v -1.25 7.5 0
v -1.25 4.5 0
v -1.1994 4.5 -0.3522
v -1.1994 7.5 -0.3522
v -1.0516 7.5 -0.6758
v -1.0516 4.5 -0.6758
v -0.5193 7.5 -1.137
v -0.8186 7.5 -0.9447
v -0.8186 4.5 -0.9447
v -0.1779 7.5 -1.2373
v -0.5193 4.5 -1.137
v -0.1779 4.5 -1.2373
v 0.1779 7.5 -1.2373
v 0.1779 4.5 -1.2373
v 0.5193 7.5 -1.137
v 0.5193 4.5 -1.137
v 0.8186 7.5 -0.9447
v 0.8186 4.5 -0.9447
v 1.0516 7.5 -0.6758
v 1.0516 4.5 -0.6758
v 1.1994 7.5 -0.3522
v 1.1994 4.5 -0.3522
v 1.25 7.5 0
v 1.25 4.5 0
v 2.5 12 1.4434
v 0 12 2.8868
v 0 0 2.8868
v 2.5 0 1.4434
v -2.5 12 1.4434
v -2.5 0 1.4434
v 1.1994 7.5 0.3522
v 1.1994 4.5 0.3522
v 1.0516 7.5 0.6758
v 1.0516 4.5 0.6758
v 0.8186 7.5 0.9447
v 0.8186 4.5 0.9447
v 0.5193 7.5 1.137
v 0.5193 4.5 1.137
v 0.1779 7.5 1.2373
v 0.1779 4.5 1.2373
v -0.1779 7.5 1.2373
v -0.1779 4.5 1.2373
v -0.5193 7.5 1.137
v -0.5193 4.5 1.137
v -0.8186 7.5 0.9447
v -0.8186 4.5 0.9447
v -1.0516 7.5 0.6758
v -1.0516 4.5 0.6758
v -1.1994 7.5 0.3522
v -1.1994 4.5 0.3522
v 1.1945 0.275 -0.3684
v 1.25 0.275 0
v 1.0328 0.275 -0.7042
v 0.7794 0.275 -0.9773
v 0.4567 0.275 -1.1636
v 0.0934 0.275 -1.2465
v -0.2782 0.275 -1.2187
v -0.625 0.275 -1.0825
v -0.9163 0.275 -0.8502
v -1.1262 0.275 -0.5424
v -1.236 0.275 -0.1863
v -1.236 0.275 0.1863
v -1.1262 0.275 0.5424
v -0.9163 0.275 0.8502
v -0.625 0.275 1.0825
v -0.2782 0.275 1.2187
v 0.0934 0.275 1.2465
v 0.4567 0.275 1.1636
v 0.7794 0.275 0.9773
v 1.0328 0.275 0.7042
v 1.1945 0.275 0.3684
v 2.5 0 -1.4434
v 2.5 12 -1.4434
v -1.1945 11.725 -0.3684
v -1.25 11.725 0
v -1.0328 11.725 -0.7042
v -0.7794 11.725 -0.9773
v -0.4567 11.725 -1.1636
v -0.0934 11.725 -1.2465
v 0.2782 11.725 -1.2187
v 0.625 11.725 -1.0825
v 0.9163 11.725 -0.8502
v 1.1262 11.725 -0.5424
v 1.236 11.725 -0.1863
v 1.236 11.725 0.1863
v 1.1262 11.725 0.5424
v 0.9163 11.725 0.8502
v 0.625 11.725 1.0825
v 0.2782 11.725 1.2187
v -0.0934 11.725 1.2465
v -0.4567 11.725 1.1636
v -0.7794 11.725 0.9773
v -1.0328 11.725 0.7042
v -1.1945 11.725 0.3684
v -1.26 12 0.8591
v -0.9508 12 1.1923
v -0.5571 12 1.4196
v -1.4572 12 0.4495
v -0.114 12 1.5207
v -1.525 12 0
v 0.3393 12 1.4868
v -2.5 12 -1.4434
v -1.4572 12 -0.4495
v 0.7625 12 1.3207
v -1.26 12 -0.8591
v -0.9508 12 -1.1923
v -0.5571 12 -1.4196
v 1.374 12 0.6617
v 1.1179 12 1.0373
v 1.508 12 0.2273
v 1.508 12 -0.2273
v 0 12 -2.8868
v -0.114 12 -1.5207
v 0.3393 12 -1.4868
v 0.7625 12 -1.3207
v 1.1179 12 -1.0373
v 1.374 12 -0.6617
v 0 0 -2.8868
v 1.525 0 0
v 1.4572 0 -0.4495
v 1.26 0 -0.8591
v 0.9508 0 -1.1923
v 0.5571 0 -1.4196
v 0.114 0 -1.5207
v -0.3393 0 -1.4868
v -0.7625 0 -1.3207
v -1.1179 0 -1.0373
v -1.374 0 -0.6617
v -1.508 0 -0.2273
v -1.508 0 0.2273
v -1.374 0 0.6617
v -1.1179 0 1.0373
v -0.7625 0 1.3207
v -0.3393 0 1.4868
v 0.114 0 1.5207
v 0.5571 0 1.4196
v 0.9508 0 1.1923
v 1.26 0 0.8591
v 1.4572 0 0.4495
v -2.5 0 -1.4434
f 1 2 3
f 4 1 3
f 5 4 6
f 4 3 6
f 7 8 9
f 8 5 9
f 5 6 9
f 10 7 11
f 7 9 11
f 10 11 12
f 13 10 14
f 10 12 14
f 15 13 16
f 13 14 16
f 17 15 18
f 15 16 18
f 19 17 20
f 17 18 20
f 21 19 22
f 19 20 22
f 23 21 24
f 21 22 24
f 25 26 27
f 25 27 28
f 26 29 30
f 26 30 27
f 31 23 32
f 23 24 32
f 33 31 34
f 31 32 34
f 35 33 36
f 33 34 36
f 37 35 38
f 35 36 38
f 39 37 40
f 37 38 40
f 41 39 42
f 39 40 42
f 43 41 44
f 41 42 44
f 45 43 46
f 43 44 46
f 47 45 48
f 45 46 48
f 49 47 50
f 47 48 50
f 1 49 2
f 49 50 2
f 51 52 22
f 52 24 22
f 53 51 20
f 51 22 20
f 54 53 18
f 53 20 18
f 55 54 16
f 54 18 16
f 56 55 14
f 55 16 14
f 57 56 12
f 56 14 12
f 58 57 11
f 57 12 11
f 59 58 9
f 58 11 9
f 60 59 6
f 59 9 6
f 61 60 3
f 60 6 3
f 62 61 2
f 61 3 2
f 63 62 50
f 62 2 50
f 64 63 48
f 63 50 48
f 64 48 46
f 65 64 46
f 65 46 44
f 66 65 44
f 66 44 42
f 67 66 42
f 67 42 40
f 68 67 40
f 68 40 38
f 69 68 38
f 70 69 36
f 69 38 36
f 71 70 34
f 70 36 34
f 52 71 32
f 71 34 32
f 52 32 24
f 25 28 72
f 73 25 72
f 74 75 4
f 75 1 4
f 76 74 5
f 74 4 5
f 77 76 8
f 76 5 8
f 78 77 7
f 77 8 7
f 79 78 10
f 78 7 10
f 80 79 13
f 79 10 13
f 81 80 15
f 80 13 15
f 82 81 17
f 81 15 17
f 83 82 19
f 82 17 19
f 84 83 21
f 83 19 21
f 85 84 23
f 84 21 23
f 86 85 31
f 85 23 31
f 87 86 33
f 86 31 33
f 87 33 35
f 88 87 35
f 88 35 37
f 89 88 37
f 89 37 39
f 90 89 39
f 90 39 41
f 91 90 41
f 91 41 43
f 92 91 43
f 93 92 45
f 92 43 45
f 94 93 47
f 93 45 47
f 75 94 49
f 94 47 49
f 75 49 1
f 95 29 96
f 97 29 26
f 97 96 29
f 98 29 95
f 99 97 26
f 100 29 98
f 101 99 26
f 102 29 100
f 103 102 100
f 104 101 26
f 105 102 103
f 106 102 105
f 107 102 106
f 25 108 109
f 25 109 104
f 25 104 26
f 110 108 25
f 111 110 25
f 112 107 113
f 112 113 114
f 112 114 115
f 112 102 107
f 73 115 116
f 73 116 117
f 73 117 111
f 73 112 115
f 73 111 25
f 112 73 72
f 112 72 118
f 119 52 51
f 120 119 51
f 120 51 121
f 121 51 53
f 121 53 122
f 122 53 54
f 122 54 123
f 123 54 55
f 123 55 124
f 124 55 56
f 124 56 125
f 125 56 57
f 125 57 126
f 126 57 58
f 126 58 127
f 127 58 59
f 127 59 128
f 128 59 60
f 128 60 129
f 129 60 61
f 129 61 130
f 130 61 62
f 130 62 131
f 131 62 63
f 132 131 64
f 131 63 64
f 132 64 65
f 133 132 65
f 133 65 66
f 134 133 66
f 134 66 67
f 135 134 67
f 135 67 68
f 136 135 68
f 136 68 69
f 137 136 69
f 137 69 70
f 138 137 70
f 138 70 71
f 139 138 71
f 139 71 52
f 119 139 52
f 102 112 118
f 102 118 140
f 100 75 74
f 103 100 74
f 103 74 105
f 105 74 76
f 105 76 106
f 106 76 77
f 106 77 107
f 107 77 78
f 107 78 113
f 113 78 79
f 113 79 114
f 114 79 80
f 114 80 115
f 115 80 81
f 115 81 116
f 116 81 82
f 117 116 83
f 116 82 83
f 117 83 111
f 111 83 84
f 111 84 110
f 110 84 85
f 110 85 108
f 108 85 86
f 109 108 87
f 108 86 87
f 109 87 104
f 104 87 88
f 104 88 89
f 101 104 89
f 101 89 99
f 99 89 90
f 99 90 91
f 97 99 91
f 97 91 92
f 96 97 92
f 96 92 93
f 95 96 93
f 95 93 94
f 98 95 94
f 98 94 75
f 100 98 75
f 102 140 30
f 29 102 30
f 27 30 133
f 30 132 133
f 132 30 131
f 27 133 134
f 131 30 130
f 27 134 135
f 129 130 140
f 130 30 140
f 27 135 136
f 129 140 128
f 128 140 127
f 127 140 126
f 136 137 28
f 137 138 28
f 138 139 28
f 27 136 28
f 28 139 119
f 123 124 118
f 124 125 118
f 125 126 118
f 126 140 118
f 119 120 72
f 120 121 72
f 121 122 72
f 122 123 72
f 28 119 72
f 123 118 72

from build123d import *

# Parameters (mm, degrees)
BOSS_EXTRUDE1_DEPTH         = 12
M3_TAPPED_HOLE1_D           = 2.5
M3_TAPPED_HOLE1_DEPTH       = 7.5
M3_TAPPED_HOLE1_CSINK_D     = 3.05
M3_TAPPED_HOLE1_CSINK_ANGLE = 90
M3_TAPPED_HOLE1_TIP         = 0.751075774
M3_TAPPED_HOLE2_D           = 2.5
M3_TAPPED_HOLE2_DEPTH       = 7.5
M3_TAPPED_HOLE2_CSINK_D     = 3.05
M3_TAPPED_HOLE2_CSINK_ANGLE = 90
M3_TAPPED_HOLE2_TIP         = 0.751075774


with BuildPart() as part:
    # Sketch1 → Boss-Extrude1 (new body)
    with BuildSketch(Plane(origin=(0, 0, 0), x_dir=(1, 0, 0), z_dir=(0, 1, 0))):
        Polygon((-2.5, 1.443375673), (-2.5, -1.443375673), (0, -2.886751346), (2.5, -1.443375673), (2.5, 1.443375673), (0, 2.886751346), align=None)
    extrude(amount=BOSS_EXTRUDE1_DEPTH)

    # M3 Tapped Hole1
    with Locations(Plane(origin=(0, 12, 0), x_dir=(1, 0, 0), z_dir=(0, 1, 0))):
        with Locations((0, 0)):
            CounterSinkHole(M3_TAPPED_HOLE1_D / 2, M3_TAPPED_HOLE1_CSINK_D / 2, depth=M3_TAPPED_HOLE1_DEPTH, counter_sink_angle=M3_TAPPED_HOLE1_CSINK_ANGLE)
            with Locations((0, 0, -(M3_TAPPED_HOLE1_DEPTH + M3_TAPPED_HOLE1_TIP / 2))):  # 118° drill point
                Cone(0, M3_TAPPED_HOLE1_D / 2, M3_TAPPED_HOLE1_TIP, mode=Mode.SUBTRACT)

    # M3 Tapped Hole2
    with Locations(Plane(origin=(0, 0, 0), x_dir=(-1, 0, 0), z_dir=(0, -1, 0))):
        with Locations((0, 0)):
            CounterSinkHole(M3_TAPPED_HOLE2_D / 2, M3_TAPPED_HOLE2_CSINK_D / 2, depth=M3_TAPPED_HOLE2_DEPTH, counter_sink_angle=M3_TAPPED_HOLE2_CSINK_ANGLE)
            with Locations((0, 0, -(M3_TAPPED_HOLE2_DEPTH + M3_TAPPED_HOLE2_TIP / 2))):  # 118° drill point
                Cone(0, M3_TAPPED_HOLE2_D / 2, M3_TAPPED_HOLE2_TIP, mode=Mode.SUBTRACT)


solid = part.part
